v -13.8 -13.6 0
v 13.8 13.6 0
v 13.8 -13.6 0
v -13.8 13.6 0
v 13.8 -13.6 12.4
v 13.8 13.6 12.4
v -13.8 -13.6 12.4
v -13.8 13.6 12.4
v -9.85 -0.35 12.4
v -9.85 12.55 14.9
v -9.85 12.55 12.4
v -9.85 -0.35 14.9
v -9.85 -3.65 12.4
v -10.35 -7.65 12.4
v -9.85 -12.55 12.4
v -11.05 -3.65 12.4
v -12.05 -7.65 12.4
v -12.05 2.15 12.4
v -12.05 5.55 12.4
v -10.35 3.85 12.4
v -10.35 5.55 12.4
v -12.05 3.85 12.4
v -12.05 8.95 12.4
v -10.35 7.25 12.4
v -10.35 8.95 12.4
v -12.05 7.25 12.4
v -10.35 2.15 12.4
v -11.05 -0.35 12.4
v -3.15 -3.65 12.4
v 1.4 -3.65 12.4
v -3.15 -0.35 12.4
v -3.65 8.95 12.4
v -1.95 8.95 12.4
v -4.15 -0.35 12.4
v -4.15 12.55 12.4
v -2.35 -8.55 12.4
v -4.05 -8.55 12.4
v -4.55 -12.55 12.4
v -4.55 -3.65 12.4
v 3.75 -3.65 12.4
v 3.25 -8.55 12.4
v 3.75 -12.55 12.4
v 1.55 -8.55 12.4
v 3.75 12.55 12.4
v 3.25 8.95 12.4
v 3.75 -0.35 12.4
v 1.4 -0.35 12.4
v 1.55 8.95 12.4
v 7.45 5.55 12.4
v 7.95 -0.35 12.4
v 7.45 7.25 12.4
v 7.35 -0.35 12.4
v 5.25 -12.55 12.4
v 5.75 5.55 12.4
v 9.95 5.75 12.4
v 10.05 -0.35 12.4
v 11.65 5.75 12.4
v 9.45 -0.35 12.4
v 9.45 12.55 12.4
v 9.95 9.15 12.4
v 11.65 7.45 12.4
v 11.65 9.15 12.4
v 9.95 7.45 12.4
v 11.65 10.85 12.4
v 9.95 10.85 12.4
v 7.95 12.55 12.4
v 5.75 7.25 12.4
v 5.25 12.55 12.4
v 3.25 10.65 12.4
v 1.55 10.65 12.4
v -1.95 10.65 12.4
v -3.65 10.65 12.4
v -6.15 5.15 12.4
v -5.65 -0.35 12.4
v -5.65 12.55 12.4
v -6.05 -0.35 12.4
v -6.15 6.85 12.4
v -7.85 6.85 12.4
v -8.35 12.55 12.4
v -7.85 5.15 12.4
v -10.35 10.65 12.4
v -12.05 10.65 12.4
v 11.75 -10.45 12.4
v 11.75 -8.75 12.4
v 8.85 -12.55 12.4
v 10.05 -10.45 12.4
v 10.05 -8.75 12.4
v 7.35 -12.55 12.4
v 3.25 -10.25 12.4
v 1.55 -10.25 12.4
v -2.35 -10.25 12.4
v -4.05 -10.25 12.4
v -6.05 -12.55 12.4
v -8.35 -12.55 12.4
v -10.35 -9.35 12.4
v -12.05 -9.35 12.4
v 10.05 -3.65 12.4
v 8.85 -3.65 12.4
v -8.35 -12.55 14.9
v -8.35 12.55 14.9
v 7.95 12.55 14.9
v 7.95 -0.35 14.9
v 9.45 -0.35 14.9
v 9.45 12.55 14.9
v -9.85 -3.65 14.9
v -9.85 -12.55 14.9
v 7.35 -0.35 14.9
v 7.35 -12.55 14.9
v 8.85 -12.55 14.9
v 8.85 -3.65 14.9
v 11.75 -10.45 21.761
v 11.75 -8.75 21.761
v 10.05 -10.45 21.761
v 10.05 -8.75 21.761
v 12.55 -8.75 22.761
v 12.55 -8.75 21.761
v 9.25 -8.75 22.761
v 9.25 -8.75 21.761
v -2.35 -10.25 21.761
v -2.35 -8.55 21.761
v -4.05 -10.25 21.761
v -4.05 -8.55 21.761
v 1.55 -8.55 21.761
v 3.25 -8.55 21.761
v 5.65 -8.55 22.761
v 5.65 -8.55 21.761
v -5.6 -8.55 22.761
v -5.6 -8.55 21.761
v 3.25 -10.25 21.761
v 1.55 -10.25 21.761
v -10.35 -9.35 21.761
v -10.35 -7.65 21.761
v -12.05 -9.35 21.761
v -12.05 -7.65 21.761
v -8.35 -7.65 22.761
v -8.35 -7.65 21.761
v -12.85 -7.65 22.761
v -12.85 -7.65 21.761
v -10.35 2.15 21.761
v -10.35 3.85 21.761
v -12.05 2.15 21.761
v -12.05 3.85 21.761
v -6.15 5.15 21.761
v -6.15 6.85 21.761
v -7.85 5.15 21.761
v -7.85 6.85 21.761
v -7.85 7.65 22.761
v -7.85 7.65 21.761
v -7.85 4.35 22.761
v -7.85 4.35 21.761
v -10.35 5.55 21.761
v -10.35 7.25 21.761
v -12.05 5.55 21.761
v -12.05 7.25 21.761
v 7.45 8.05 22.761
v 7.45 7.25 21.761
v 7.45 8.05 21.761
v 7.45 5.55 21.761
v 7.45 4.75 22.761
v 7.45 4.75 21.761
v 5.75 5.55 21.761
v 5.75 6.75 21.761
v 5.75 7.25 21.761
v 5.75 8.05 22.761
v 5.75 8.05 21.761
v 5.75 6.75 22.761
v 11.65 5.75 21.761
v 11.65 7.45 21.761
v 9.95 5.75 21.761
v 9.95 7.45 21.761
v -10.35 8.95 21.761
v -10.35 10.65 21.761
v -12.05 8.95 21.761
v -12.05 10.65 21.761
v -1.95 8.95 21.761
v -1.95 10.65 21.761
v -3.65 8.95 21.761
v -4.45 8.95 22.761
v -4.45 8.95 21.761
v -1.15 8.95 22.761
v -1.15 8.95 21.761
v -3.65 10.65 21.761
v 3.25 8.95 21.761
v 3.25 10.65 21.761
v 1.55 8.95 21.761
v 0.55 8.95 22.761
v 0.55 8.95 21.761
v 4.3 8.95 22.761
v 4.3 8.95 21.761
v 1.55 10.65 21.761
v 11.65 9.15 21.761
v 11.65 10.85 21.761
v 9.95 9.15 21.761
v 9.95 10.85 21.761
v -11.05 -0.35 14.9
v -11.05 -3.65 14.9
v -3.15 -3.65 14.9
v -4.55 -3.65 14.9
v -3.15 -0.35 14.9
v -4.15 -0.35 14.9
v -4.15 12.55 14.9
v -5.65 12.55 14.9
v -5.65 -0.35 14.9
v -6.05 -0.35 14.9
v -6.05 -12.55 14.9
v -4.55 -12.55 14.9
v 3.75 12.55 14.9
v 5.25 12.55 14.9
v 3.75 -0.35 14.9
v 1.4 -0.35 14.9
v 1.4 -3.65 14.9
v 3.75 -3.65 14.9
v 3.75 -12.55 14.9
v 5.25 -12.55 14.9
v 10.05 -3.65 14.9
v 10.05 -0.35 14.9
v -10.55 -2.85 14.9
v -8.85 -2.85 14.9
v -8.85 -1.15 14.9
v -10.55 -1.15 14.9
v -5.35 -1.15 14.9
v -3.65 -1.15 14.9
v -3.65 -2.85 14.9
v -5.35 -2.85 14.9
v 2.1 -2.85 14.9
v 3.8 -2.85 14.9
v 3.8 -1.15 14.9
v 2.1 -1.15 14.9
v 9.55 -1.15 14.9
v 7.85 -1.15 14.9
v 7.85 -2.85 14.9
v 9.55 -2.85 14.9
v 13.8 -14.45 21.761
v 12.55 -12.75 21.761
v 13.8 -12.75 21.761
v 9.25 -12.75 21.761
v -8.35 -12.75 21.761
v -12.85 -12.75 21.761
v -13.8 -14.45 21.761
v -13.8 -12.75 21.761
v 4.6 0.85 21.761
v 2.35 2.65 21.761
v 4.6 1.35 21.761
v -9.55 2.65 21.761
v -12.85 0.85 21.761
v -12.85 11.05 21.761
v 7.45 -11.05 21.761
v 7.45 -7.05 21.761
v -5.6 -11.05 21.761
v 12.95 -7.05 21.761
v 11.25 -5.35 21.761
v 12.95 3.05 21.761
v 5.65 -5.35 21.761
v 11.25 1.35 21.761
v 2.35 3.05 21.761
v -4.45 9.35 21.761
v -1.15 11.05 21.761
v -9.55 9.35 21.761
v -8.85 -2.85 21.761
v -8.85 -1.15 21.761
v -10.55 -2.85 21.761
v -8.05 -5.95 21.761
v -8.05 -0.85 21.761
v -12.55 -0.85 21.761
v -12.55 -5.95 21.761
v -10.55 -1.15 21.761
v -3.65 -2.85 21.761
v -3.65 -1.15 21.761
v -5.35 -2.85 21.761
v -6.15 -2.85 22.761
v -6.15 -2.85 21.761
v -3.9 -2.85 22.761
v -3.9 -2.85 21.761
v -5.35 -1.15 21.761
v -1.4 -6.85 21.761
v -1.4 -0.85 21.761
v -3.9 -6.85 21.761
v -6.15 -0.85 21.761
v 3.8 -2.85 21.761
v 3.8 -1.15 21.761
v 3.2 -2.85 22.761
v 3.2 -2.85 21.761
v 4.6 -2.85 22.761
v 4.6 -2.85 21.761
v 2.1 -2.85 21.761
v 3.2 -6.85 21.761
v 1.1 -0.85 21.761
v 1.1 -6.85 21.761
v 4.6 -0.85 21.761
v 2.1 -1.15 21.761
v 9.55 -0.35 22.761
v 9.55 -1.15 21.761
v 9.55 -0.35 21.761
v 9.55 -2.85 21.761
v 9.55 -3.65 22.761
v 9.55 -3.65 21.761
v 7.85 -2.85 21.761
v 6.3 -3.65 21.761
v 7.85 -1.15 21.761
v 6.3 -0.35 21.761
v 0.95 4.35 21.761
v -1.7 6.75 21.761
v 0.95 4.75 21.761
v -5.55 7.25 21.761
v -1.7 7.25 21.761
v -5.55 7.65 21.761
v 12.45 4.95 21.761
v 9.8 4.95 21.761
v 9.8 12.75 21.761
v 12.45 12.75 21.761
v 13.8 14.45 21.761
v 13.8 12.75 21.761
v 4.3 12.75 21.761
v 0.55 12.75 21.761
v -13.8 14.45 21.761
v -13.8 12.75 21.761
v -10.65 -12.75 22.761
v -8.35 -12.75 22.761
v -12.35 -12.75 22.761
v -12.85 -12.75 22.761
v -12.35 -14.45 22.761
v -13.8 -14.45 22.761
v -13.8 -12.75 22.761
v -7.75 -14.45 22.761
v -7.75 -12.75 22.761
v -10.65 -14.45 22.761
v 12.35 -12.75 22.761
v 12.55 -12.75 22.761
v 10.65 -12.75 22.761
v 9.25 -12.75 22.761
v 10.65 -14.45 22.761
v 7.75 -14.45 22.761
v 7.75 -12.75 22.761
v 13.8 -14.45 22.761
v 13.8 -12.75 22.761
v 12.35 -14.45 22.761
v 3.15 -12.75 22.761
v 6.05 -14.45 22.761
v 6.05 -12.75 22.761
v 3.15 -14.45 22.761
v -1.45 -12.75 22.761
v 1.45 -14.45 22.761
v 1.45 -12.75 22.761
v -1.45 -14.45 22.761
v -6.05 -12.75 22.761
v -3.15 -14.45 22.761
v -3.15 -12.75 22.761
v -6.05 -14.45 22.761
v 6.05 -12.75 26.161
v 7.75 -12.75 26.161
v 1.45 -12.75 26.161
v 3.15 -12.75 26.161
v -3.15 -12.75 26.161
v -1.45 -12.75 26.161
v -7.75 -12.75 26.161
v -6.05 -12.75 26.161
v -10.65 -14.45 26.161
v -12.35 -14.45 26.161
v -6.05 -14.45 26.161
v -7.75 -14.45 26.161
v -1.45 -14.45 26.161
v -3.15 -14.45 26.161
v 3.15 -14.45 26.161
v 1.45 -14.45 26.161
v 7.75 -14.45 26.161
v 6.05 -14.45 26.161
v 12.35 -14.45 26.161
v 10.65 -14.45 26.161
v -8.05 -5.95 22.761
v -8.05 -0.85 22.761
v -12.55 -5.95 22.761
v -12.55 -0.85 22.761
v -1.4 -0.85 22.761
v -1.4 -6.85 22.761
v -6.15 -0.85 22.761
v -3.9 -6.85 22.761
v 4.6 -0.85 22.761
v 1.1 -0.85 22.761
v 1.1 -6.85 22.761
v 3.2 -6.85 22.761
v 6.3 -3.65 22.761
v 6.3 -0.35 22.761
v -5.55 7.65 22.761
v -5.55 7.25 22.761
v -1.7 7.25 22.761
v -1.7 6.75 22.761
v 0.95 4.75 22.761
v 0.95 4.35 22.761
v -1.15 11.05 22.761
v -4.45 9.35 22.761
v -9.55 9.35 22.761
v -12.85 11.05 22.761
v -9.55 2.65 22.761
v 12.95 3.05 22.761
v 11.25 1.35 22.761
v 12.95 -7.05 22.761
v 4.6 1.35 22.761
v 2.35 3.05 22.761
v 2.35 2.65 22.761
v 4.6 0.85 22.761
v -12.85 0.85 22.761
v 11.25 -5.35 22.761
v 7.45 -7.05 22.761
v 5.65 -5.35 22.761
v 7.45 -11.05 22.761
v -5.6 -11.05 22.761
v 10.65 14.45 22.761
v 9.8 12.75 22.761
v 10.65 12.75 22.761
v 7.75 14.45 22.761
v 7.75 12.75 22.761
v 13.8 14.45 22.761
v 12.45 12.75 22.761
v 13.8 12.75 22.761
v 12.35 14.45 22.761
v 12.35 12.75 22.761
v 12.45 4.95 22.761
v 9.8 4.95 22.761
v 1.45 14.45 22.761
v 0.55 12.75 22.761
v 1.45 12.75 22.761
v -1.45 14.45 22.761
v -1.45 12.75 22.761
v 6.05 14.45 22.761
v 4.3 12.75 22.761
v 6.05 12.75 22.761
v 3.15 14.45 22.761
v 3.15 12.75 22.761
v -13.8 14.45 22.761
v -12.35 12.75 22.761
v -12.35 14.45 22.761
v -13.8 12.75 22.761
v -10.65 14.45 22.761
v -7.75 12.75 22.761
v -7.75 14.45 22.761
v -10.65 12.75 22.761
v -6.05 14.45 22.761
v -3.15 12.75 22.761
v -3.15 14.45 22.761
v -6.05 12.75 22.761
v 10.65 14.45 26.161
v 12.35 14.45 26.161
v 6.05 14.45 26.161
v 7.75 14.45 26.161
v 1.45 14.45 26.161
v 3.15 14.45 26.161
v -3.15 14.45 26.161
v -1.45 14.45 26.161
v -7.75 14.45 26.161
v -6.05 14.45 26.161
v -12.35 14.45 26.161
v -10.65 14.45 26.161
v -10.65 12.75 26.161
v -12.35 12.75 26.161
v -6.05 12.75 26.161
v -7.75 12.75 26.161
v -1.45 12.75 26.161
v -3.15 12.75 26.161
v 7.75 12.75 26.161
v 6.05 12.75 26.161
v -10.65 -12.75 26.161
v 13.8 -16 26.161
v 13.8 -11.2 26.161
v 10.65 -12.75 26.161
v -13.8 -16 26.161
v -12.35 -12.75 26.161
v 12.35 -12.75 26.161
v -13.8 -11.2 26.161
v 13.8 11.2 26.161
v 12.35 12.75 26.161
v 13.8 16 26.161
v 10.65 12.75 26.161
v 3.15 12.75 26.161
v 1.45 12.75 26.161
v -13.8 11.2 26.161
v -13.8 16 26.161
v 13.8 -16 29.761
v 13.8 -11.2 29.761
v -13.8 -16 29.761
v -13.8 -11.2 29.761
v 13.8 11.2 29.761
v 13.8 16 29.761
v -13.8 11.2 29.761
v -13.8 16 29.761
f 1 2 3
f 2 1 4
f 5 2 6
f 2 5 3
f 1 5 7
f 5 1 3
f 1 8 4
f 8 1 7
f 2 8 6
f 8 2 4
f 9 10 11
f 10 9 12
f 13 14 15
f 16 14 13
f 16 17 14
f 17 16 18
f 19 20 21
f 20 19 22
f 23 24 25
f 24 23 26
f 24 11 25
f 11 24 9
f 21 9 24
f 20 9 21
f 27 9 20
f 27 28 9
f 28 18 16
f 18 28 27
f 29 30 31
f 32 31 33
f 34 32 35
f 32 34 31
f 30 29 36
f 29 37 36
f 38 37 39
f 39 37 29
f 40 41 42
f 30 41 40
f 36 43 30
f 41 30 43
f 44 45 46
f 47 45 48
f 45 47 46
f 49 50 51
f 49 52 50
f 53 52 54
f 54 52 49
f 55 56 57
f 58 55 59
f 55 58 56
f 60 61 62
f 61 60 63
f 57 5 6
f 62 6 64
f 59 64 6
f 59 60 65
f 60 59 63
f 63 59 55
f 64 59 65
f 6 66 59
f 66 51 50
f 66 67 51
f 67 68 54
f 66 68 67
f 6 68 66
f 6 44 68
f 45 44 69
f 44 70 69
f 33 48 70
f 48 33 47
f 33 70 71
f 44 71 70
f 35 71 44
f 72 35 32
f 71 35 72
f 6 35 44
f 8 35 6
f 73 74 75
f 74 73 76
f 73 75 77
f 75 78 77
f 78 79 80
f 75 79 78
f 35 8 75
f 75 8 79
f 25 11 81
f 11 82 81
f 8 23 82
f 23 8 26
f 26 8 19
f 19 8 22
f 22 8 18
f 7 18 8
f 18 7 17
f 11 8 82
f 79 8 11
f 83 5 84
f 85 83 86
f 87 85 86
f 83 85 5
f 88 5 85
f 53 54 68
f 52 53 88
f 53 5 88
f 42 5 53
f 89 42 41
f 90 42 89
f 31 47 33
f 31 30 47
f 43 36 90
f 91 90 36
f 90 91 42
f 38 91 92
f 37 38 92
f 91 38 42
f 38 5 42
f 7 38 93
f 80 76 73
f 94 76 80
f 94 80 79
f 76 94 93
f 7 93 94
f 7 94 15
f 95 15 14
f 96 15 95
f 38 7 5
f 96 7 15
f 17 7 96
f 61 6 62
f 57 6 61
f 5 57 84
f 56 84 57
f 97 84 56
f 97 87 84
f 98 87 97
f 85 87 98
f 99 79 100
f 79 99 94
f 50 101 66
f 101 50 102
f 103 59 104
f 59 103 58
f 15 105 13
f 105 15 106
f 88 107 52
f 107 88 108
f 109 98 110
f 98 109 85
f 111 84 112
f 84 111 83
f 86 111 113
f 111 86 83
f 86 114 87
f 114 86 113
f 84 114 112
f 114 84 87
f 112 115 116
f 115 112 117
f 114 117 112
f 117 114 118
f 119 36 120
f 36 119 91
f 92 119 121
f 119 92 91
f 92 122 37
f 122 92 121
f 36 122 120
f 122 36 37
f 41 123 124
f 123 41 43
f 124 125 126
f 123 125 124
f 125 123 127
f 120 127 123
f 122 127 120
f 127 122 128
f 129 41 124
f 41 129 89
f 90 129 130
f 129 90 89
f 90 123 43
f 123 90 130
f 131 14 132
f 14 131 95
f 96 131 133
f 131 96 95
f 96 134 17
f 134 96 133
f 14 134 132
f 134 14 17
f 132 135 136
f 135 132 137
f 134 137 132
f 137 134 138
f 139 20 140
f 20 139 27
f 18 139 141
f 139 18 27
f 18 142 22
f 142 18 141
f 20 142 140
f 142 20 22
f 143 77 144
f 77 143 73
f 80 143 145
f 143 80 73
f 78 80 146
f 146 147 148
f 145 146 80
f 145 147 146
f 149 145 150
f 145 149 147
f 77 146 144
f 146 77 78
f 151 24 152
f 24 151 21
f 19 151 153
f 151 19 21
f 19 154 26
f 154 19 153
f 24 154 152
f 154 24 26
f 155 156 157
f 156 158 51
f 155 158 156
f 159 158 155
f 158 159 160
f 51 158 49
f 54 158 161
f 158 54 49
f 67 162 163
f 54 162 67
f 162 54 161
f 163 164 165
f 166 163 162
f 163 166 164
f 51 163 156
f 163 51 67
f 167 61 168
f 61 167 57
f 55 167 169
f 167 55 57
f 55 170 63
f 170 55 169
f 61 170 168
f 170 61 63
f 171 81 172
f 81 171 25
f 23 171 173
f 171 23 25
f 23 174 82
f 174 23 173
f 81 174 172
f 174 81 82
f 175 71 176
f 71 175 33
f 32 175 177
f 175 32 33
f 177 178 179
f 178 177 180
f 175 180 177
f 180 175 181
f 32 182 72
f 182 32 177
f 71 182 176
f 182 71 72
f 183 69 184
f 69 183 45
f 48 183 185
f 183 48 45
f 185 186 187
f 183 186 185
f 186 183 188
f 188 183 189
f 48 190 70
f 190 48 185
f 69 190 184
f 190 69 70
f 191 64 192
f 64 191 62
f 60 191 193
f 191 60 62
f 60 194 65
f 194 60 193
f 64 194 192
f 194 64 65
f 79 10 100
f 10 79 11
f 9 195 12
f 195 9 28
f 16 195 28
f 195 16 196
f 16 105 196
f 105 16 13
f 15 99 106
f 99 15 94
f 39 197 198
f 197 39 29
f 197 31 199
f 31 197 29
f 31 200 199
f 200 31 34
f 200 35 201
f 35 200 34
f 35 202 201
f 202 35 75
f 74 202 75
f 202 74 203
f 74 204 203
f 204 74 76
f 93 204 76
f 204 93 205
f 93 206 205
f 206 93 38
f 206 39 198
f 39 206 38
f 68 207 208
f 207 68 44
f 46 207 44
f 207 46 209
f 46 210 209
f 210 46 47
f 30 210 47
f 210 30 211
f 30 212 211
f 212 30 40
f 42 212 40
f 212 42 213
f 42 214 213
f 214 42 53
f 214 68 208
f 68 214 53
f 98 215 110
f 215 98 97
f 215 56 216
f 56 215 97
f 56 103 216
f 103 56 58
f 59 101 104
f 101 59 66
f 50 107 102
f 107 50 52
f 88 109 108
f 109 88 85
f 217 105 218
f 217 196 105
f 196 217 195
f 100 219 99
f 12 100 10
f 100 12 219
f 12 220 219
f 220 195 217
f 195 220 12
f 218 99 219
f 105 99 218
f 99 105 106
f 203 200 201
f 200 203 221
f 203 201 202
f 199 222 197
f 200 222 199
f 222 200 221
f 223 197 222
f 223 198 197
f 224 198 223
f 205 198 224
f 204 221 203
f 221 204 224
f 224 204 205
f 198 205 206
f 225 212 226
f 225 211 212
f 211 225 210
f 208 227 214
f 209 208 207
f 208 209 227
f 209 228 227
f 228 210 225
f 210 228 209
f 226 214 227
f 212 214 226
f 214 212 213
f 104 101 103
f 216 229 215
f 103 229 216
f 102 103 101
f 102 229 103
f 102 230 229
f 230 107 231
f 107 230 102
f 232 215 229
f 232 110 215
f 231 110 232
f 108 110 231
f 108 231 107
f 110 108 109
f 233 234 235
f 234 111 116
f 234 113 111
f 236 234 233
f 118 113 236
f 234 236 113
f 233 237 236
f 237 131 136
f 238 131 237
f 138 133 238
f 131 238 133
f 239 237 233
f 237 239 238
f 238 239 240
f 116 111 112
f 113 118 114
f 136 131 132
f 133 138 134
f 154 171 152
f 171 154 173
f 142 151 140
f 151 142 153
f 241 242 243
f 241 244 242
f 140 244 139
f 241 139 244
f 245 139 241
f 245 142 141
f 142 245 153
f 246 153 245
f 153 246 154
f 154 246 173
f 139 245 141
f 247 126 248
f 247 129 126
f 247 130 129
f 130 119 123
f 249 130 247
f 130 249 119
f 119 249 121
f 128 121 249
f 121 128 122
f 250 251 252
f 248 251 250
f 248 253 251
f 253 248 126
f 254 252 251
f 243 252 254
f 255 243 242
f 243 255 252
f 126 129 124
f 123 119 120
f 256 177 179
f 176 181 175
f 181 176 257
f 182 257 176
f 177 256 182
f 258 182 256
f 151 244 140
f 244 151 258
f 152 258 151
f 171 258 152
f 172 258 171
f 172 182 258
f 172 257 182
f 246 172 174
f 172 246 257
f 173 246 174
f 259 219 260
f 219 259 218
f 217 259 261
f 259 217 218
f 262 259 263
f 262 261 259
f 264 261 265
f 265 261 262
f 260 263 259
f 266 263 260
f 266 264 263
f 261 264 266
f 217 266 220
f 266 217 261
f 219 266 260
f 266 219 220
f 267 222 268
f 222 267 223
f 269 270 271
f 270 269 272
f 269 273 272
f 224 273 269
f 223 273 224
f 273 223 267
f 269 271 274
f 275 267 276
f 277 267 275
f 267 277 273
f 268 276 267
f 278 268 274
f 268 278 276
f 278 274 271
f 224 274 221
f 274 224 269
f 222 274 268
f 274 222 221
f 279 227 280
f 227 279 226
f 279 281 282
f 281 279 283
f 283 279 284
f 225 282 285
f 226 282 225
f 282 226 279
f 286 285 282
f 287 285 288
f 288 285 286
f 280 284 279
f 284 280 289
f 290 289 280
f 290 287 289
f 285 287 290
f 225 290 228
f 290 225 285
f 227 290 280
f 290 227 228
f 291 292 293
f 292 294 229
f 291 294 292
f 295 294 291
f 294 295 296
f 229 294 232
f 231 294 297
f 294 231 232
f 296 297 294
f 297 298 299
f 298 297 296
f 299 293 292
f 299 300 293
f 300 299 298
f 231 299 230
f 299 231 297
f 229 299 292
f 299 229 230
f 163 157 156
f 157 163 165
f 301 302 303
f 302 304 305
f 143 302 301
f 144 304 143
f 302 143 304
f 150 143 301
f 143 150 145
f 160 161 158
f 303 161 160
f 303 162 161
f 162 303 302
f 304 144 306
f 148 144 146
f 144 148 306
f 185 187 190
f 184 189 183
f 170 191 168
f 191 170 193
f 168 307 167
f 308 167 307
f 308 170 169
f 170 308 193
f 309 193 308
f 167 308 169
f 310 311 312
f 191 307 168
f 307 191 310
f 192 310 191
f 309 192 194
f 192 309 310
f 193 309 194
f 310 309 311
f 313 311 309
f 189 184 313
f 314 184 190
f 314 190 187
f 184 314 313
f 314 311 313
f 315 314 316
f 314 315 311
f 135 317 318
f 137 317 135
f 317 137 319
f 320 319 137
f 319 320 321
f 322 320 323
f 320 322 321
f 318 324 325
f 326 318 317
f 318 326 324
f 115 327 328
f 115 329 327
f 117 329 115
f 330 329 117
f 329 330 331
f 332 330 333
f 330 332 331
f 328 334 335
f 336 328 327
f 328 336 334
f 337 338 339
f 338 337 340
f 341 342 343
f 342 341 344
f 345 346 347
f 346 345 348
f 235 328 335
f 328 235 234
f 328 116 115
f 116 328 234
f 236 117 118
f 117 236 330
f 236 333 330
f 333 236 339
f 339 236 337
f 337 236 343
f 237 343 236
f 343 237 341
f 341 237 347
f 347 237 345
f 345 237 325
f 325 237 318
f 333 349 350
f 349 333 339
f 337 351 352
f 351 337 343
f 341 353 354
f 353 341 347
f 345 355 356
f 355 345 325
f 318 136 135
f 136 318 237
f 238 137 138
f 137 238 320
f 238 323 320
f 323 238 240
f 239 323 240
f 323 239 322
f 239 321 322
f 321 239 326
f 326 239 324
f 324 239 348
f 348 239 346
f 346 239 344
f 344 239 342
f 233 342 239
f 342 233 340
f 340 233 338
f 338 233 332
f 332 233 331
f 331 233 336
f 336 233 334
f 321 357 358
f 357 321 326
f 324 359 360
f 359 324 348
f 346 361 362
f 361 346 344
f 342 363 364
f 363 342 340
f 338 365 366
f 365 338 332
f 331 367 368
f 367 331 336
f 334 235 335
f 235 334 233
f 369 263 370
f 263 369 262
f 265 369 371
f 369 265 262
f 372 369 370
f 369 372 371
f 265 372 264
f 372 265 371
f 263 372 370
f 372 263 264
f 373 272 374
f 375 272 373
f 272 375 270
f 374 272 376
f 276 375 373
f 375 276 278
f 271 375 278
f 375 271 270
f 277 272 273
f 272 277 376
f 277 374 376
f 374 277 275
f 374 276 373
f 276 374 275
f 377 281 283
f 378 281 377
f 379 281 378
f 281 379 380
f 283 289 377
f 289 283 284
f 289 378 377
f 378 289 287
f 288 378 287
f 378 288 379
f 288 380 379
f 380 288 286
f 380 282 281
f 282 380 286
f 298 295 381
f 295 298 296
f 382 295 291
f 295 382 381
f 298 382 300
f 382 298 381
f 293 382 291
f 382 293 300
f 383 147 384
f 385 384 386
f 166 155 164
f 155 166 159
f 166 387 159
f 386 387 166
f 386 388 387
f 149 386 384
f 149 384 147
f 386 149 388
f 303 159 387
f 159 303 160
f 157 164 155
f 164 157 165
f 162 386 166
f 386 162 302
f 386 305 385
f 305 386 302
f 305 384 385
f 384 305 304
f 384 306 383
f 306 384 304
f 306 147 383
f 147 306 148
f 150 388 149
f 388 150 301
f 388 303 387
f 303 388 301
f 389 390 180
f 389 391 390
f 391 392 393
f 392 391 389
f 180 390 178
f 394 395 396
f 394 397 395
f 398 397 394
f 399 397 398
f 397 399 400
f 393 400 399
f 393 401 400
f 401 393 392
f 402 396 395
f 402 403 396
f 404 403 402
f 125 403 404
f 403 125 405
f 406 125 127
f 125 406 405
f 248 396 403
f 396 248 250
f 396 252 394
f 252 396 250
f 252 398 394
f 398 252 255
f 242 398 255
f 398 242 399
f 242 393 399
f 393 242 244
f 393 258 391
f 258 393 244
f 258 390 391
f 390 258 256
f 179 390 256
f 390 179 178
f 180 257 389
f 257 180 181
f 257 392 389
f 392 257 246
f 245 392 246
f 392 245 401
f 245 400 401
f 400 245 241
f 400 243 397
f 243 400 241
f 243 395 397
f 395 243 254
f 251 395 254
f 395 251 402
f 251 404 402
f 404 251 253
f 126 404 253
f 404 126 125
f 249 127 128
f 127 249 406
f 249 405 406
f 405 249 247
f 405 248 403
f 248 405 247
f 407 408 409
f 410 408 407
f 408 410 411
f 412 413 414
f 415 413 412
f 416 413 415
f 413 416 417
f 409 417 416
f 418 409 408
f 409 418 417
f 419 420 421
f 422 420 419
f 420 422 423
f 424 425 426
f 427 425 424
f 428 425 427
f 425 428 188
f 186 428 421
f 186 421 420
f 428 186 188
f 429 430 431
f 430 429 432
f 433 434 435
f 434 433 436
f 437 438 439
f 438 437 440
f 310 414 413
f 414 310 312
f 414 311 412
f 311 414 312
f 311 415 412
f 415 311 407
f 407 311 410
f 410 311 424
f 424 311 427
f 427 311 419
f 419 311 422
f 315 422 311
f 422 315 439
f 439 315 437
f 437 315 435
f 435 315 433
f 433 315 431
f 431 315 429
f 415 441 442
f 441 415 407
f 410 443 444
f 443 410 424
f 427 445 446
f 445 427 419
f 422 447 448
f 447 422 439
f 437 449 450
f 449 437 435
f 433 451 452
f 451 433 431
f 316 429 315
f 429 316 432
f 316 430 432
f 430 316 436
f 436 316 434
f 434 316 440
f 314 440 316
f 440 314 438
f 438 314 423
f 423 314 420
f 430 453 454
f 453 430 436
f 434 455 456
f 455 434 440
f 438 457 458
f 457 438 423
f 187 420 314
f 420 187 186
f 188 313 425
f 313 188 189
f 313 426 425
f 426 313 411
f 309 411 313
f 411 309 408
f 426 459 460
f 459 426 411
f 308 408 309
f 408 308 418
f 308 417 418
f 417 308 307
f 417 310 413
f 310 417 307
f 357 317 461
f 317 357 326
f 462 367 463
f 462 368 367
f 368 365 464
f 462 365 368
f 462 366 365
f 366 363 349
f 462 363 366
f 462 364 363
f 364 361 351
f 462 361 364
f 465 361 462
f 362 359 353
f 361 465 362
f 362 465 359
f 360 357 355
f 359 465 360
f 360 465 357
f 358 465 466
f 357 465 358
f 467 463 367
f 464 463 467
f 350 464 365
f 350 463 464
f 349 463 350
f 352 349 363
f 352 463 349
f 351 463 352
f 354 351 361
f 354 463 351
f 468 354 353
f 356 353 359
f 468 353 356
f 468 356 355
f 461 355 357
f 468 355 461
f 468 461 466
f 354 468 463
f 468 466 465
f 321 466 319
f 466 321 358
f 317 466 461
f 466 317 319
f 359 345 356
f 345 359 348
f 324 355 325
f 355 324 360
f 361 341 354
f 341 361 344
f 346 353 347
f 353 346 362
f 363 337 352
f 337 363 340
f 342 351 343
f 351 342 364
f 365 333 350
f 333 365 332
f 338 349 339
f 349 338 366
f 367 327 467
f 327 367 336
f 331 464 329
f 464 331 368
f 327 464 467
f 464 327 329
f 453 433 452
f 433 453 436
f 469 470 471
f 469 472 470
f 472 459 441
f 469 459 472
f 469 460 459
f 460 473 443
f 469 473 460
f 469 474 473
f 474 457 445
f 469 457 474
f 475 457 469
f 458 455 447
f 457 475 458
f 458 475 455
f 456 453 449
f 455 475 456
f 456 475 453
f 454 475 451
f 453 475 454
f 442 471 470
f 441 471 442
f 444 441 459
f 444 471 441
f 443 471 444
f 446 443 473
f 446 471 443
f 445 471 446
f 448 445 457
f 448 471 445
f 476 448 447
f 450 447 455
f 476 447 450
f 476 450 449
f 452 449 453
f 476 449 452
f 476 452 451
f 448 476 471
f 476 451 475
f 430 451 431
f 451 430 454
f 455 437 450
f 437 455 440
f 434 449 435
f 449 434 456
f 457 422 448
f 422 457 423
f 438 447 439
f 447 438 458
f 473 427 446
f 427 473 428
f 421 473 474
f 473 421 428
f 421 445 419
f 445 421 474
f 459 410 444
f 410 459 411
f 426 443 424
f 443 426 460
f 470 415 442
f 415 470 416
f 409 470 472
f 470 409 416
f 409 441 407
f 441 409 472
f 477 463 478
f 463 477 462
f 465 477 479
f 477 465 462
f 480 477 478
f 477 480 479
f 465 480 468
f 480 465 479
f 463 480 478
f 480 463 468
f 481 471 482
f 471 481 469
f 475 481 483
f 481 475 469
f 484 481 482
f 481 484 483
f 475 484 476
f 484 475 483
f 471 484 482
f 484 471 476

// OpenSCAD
// Generated by SolidPython 0.4.2 on 2020-09-29 23:19:48
//!OpenSCAD

scale(v = 0.0100000000) {
	translate(v = [-1380, -1360, 0]) {
		union() {
			color(c = [0.4000000000, 0.4000000000, 0.4000000000]) {
				translate(v = [0, 0, 0]) {
					linear_extrude(height = 1000.0000000000) {
						polygon(paths = [[0, 1, 2, 3]], points = [[0, 0], [0, 2720], [2760, 2720], [2760, 0]]);
					}
				}
			}
			color(c = [0.2000000000, 0.6000000000, 0.2000000000]) {
				translate(v = [0, 0, 1000.0000000000]) {
					linear_extrude(height = 120.0000000000) {
						polygon(paths = [[0, 1, 2, 3]], points = [[0, 1305], [0, 2720], [2760, 2720], [2760, 1305]]);
					}
				}
			}
			color(c = [0.4000000000, 0.4000000000, 0.4000000000]) {
				translate(v = [0, 0, 1000.0000000000]) {
					linear_extrude(height = 120.0000000000) {
						polygon(paths = [[0, 1, 2, 3]], points = [[0, 0], [0, 1305], [2760, 1305], [2760, 0]]);
					}
				}
			}
			color(c = [0.9000000000, 0.6000000000, 0.6000000000]) {
				translate(v = [0, 0, 1120.0000000000]) {
					linear_extrude(height = 120.0000000000) {
						polygon(paths = [[0, 1, 2, 3]], points = [[135, 1485], [135, 2485], [395, 2485], [395, 1485]]);
					}
				}
			}
			color(c = [0.9000000000, 0.6000000000, 0.6000000000]) {
				translate(v = [0, 0, 1120.0000000000]) {
					linear_extrude(height = 120.0000000000) {
						polygon(paths = [[0, 1, 2, 3]], points = [[545, 1485], [545, 2485], [815, 2485], [815, 1485]]);
					}
				}
			}
			color(c = [0.9000000000, 0.6000000000, 0.6000000000]) {
				translate(v = [0, 0, 1120.0000000000]) {
					linear_extrude(height = 120.0000000000) {
						polygon(paths = [[0, 1, 2, 3]], points = [[965, 1485], [965, 2485], [1225, 2485], [1225, 1485]]);
					}
				}
			}
			color(c = [0.9000000000, 0.6000000000, 0.6000000000]) {
				translate(v = [0, 0, 1120.0000000000]) {
					linear_extrude(height = 120.0000000000) {
						polygon(paths = [[0, 1, 2, 3]], points = [[1495, 1485], [1495, 2485], [1755, 2485], [1755, 1485]]);
					}
				}
			}
			color(c = [0.9000000000, 0.6000000000, 0.6000000000]) {
				translate(v = [0, 0, 1120.0000000000]) {
					linear_extrude(height = 120.0000000000) {
						polygon(paths = [[0, 1, 2, 3]], points = [[1905, 1485], [1905, 2485], [2175, 2485], [2175, 1485]]);
					}
				}
			}
			color(c = [0.9000000000, 0.6000000000, 0.6000000000]) {
				translate(v = [0, 0, 1120.0000000000]) {
					linear_extrude(height = 120.0000000000) {
						polygon(paths = [[0, 1, 2, 3]], points = [[2325, 1485], [2325, 2485], [2625, 2485], [2625, 1485]]);
					}
				}
			}
			color(c = [0.9000000000, 0.6000000000, 0.9000000000]) {
				translate(v = [0, 0, 1120.0000000000]) {
					linear_extrude(height = 120.0000000000) {
						polygon(paths = [[0, 1, 2, 3]], points = [[135, 235], [135, 885], [395, 885], [395, 235]]);
					}
				}
			}
			color(c = [0.9000000000, 0.6000000000, 0.9000000000]) {
				translate(v = [0, 0, 1120.0000000000]) {
					linear_extrude(height = 120.0000000000) {
						polygon(paths = [[0, 1, 2, 3]], points = [[545, 235], [545, 885], [775, 885], [775, 235]]);
					}
				}
			}
			color(c = [0.9000000000, 0.6000000000, 0.9000000000]) {
				translate(v = [0, 0, 1120.0000000000]) {
					linear_extrude(height = 120.0000000000) {
						polygon(paths = [[0, 1, 2, 3]], points = [[925, 235], [925, 885], [1185, 885], [1185, 235]]);
					}
				}
			}
			color(c = [0.9000000000, 0.6000000000, 0.9000000000]) {
				translate(v = [0, 0, 1120.0000000000]) {
					linear_extrude(height = 120.0000000000) {
						polygon(paths = [[0, 1, 2, 3]], points = [[1495, 235], [1495, 885], [1755, 885], [1755, 235]]);
					}
				}
			}
			color(c = [0.9000000000, 0.6000000000, 0.9000000000]) {
				translate(v = [0, 0, 1120.0000000000]) {
					linear_extrude(height = 120.0000000000) {
						polygon(paths = [[0, 1, 2, 3]], points = [[1905, 235], [1905, 885], [2115, 885], [2115, 235]]);
					}
				}
			}
			color(c = [0.9000000000, 0.6000000000, 0.9000000000]) {
				translate(v = [0, 0, 1120.0000000000]) {
					linear_extrude(height = 120.0000000000) {
						polygon(paths = [[0, 1, 2, 3]], points = [[2265, 235], [2265, 885], [2625, 885], [2625, 235]]);
					}
				}
			}
			color(c = [0.2000000000, 0.6000000000, 0.2000000000]) {
				translate(v = [0, 0, 1120.0000000000]) {
					linear_extrude(height = 120.0000000000) {
						difference() {
							polygon(paths = [[0, 1, 2, 3]], points = [[0, 1305], [0, 2720], [2760, 2720], [2760, 1305]]);
							polygon(paths = [[0, 1, 2, 3]], points = [[135, 1485], [395, 1485], [395, 2485], [135, 2485]]);
							polygon(paths = [[0, 1, 2, 3]], points = [[545, 1485], [815, 1485], [815, 2485], [545, 2485]]);
							polygon(paths = [[0, 1, 2, 3]], points = [[965, 1485], [1225, 1485], [1225, 2485], [965, 2485]]);
							polygon(paths = [[0, 1, 2, 3]], points = [[1495, 1485], [1755, 1485], [1755, 2485], [1495, 2485]]);
							polygon(paths = [[0, 1, 2, 3]], points = [[1905, 1485], [2175, 1485], [2175, 2485], [1905, 2485]]);
							polygon(paths = [[0, 1, 2, 3]], points = [[2325, 1485], [2625, 1485], [2625, 2485], [2325, 2485]]);
						}
					}
				}
			}
			color(c = [0.4000000000, 0.4000000000, 0.4000000000]) {
				translate(v = [0, 0, 1120.0000000000]) {
					linear_extrude(height = 120.0000000000) {
						difference() {
							polygon(paths = [[0, 1, 2, 3]], points = [[0, 0], [0, 1305], [2760, 1305], [2760, 0]]);
							polygon(paths = [[0, 1, 2, 3]], points = [[135, 235], [395, 235], [395, 885], [135, 885]]);
							polygon(paths = [[0, 1, 2, 3]], points = [[545, 235], [775, 235], [775, 885], [545, 885]]);
							polygon(paths = [[0, 1, 2, 3]], points = [[925, 235], [1185, 235], [1185, 885], [925, 885]]);
							polygon(paths = [[0, 1, 2, 3]], points = [[1495, 235], [1755, 235], [1755, 885], [1495, 885]]);
							polygon(paths = [[0, 1, 2, 3]], points = [[1905, 235], [2115, 235], [2115, 885], [1905, 885]]);
							polygon(paths = [[0, 1, 2, 3]], points = [[2265, 235], [2625, 235], [2625, 885], [2265, 885]]);
						}
					}
				}
			}
			color(c = [0.1000000000, 0.1000000000, 0.1000000000]) {
				translate(v = [0, 0, 1240.0000000000]) {
					linear_extrude(height = 70.0000000000) {
						polygon(paths = [[0, 1, 2, 3]], points = [[2385, 315], [2385, 485], [2555, 485], [2555, 315]]);
					}
				}
			}
			color(c = [0.1000000000, 0.1000000000, 0.1000000000]) {
				translate(v = [0, 0, 1240.0000000000]) {
					linear_extrude(height = 70.0000000000) {
						polygon(paths = [[0, 1, 2, 3]], points = [[975, 335], [975, 505], [1145, 505], [1145, 335]]);
					}
				}
			}
			color(c = [0.1000000000, 0.1000000000, 0.1000000000]) {
				translate(v = [0, 0, 1240.0000000000]) {
					linear_extrude(height = 70.0000000000) {
						polygon(paths = [[0, 1, 2, 3]], points = [[1535, 335], [1535, 505], [1705, 505], [1705, 335]]);
					}
				}
			}
			color(c = [0.1000000000, 0.1000000000, 0.1000000000]) {
				translate(v = [0, 0, 1240.0000000000]) {
					linear_extrude(height = 70.0000000000) {
						polygon(paths = [[0, 1, 2, 3]], points = [[175, 425], [175, 595], [345, 595], [345, 425]]);
					}
				}
			}
			color(c = [0.1000000000, 0.1000000000, 0.1000000000]) {
				translate(v = [0, 0, 1240.0000000000]) {
					linear_extrude(height = 70.0000000000) {
						polygon(paths = [[0, 1, 2, 3]], points = [[175, 1575], [175, 1745], [345, 1745], [345, 1575]]);
					}
				}
			}
			color(c = [0.1000000000, 0.1000000000, 0.1000000000]) {
				translate(v = [0, 0, 1240.0000000000]) {
					linear_extrude(height = 70.0000000000) {
						polygon(paths = [[0, 1, 2, 3]], points = [[595, 1875], [595, 2045], [765, 2045], [765, 1875]]);
					}
				}
			}
			color(c = [0.1000000000, 0.1000000000, 0.1000000000]) {
				translate(v = [0, 0, 1240.0000000000]) {
					linear_extrude(height = 70.0000000000) {
						polygon(paths = [[0, 1, 2, 3]], points = [[175, 1915], [175, 2085], [345, 2085], [345, 1915]]);
					}
				}
			}
			color(c = [0.1000000000, 0.1000000000, 0.1000000000]) {
				translate(v = [0, 0, 1240.0000000000]) {
					linear_extrude(height = 70.0000000000) {
						polygon(paths = [[0, 1, 2, 3]], points = [[1955, 1915], [1955, 2085], [2125, 2085], [2125, 1915]]);
					}
				}
			}
			color(c = [0.1000000000, 0.1000000000, 0.1000000000]) {
				translate(v = [0, 0, 1240.0000000000]) {
					linear_extrude(height = 70.0000000000) {
						polygon(paths = [[0, 1, 2, 3]], points = [[2375, 1935], [2375, 2105], [2545, 2105], [2545, 1935]]);
					}
				}
			}
			color(c = [0.1000000000, 0.1000000000, 0.1000000000]) {
				translate(v = [0, 0, 1240.0000000000]) {
					linear_extrude(height = 70.0000000000) {
						polygon(paths = [[0, 1, 2, 3]], points = [[175, 2255], [175, 2425], [345, 2425], [345, 2255]]);
					}
				}
			}
			color(c = [0.1000000000, 0.1000000000, 0.1000000000]) {
				translate(v = [0, 0, 1240.0000000000]) {
					linear_extrude(height = 70.0000000000) {
						polygon(paths = [[0, 1, 2, 3]], points = [[1015, 2255], [1015, 2425], [1185, 2425], [1185, 2255]]);
					}
				}
			}
			color(c = [0.1000000000, 0.1000000000, 0.1000000000]) {
				translate(v = [0, 0, 1240.0000000000]) {
					linear_extrude(height = 70.0000000000) {
						polygon(paths = [[0, 1, 2, 3]], points = [[1535, 2255], [1535, 2425], [1705, 2425], [1705, 2255]]);
					}
				}
			}
			color(c = [0.1000000000, 0.1000000000, 0.1000000000]) {
				translate(v = [0, 0, 1240.0000000000]) {
					linear_extrude(height = 70.0000000000) {
						polygon(paths = [[0, 1, 2, 3]], points = [[2375, 2275], [2375, 2445], [2545, 2445], [2545, 2275]]);
					}
				}
			}
			color(c = [1.0000000000, 1.0000000000, 1.0000000000]) {
				translate(v = [0, 0, 1240.0000000000]) {
					linear_extrude(height = 70.0000000000) {
						polygon(paths = [[0, 1, 2, 3, 4, 5, 6, 7]], points = [[395, 105], [395, 995], [275, 995], [275, 1325], [395, 1325], [395, 2615], [545, 2615], [545, 105]]);
					}
				}
			}
			color(c = [1.0000000000, 1.0000000000, 1.0000000000]) {
				translate(v = [0, 0, 1240.0000000000]) {
					linear_extrude(height = 70.0000000000) {
						polygon(paths = [[0, 1, 2, 3, 4, 5, 6, 7, 8, 9]], points = [[775, 105], [775, 1325], [815, 1325], [815, 2615], [965, 2615], [965, 1325], [1065, 1325], [1065, 995], [925, 995], [925, 105]]);
					}
				}
			}
			color(c = [1.0000000000, 1.0000000000, 1.0000000000]) {
				translate(v = [0, 0, 1240.0000000000]) {
					linear_extrude(height = 70.0000000000) {
						polygon(paths = [[0, 1, 2, 3, 4, 5, 6, 7]], points = [[1755, 105], [1755, 995], [1520, 995], [1520, 1325], [1755, 1325], [1755, 2615], [1905, 2615], [1905, 105]]);
					}
				}
			}
			color(c = [1.0000000000, 1.0000000000, 1.0000000000]) {
				translate(v = [0, 0, 1240.0000000000]) {
					linear_extrude(height = 70.0000000000) {
						polygon(paths = [[0, 1, 2, 3, 4, 5, 6, 7, 8, 9]], points = [[2115, 105], [2115, 1325], [2175, 1325], [2175, 2615], [2325, 2615], [2325, 1325], [2385, 1325], [2385, 995], [2265, 995], [2265, 105]]);
					}
				}
			}
			color(c = [0.1000000000, 0.1000000000, 0.1000000000]) {
				translate(v = [0, 0, 1310.0000000000]) {
					linear_extrude(height = 180.0000000000) {
						polygon(paths = [[0, 1, 2, 3]], points = [[2385, 315], [2385, 485], [2555, 485], [2555, 315]]);
					}
				}
			}
			color(c = [0.1000000000, 0.1000000000, 0.1000000000]) {
				translate(v = [0, 0, 1310.0000000000]) {
					linear_extrude(height = 180.0000000000) {
						polygon(paths = [[0, 1, 2, 3]], points = [[975, 335], [975, 505], [1145, 505], [1145, 335]]);
					}
				}
			}
			color(c = [0.1000000000, 0.1000000000, 0.1000000000]) {
				translate(v = [0, 0, 1310.0000000000]) {
					linear_extrude(height = 180.0000000000) {
						polygon(paths = [[0, 1, 2, 3]], points = [[1535, 335], [1535, 505], [1705, 505], [1705, 335]]);
					}
				}
			}
			color(c = [0.1000000000, 0.1000000000, 0.1000000000]) {
				translate(v = [0, 0, 1310.0000000000]) {
					linear_extrude(height = 180.0000000000) {
						polygon(paths = [[0, 1, 2, 3]], points = [[175, 425], [175, 595], [345, 595], [345, 425]]);
					}
				}
			}
			color(c = [0.1000000000, 0.1000000000, 0.1000000000]) {
				translate(v = [0, 0, 1310.0000000000]) {
					linear_extrude(height = 180.0000000000) {
						polygon(paths = [[0, 1, 2, 3]], points = [[175, 1575], [175, 1745], [345, 1745], [345, 1575]]);
					}
				}
			}
			color(c = [0.1000000000, 0.1000000000, 0.1000000000]) {
				translate(v = [0, 0, 1310.0000000000]) {
					linear_extrude(height = 180.0000000000) {
						polygon(paths = [[0, 1, 2, 3]], points = [[595, 1875], [595, 2045], [765, 2045], [765, 1875]]);
					}
				}
			}
			color(c = [0.1000000000, 0.1000000000, 0.1000000000]) {
				translate(v = [0, 0, 1310.0000000000]) {
					linear_extrude(height = 180.0000000000) {
						polygon(paths = [[0, 1, 2, 3]], points = [[175, 1915], [175, 2085], [345, 2085], [345, 1915]]);
					}
				}
			}
			color(c = [0.1000000000, 0.1000000000, 0.1000000000]) {
				translate(v = [0, 0, 1310.0000000000]) {
					linear_extrude(height = 180.0000000000) {
						polygon(paths = [[0, 1, 2, 3]], points = [[1955, 1915], [1955, 2085], [2125, 2085], [2125, 1915]]);
					}
				}
			}
			color(c = [0.1000000000, 0.1000000000, 0.1000000000]) {
				translate(v = [0, 0, 1310.0000000000]) {
					linear_extrude(height = 180.0000000000) {
						polygon(paths = [[0, 1, 2, 3]], points = [[2375, 1935], [2375, 2105], [2545, 2105], [2545, 1935]]);
					}
				}
			}
			color(c = [0.1000000000, 0.1000000000, 0.1000000000]) {
				translate(v = [0, 0, 1310.0000000000]) {
					linear_extrude(height = 180.0000000000) {
						polygon(paths = [[0, 1, 2, 3]], points = [[175, 2255], [175, 2425], [345, 2425], [345, 2255]]);
					}
				}
			}
			color(c = [0.1000000000, 0.1000000000, 0.1000000000]) {
				translate(v = [0, 0, 1310.0000000000]) {
					linear_extrude(height = 180.0000000000) {
						polygon(paths = [[0, 1, 2, 3]], points = [[1015, 2255], [1015, 2425], [1185, 2425], [1185, 2255]]);
					}
				}
			}
			color(c = [0.1000000000, 0.1000000000, 0.1000000000]) {
				translate(v = [0, 0, 1310.0000000000]) {
					linear_extrude(height = 180.0000000000) {
						polygon(paths = [[0, 1, 2, 3]], points = [[1535, 2255], [1535, 2425], [1705, 2425], [1705, 2255]]);
					}
				}
			}
			color(c = [0.1000000000, 0.1000000000, 0.1000000000]) {
				translate(v = [0, 0, 1310.0000000000]) {
					linear_extrude(height = 180.0000000000) {
						polygon(paths = [[0, 1, 2, 3]], points = [[2375, 2275], [2375, 2445], [2545, 2445], [2545, 2275]]);
					}
				}
			}
			color(c = [0.7000000000, 0, 0]) {
				translate(v = [0, 0, 1310.0000000000]) {
					linear_extrude(height = 180.0000000000) {
						polygon(paths = [[0, 1, 2, 3, 4, 5, 6, 7]], points = [[395, 105], [395, 995], [275, 995], [275, 1325], [395, 1325], [395, 2615], [545, 2615], [545, 105]]);
					}
				}
			}
			color(c = [0.7000000000, 0, 0]) {
				translate(v = [0, 0, 1310.0000000000]) {
					linear_extrude(height = 180.0000000000) {
						polygon(paths = [[0, 1, 2, 3, 4, 5, 6, 7, 8, 9]], points = [[775, 105], [775, 1325], [815, 1325], [815, 2615], [965, 2615], [965, 1325], [1065, 1325], [1065, 995], [925, 995], [925, 105]]);
					}
				}
			}
			color(c = [0.7000000000, 0, 0]) {
				translate(v = [0, 0, 1310.0000000000]) {
					linear_extrude(height = 180.0000000000) {
						polygon(paths = [[0, 1, 2, 3, 4, 5, 6, 7]], points = [[1755, 105], [1755, 995], [1520, 995], [1520, 1325], [1755, 1325], [1755, 2615], [1905, 2615], [1905, 105]]);
					}
				}
			}
			color(c = [0.7000000000, 0, 0]) {
				translate(v = [0, 0, 1310.0000000000]) {
					linear_extrude(height = 180.0000000000) {
						polygon(paths = [[0, 1, 2, 3, 4, 5, 6, 7, 8, 9]], points = [[2115, 105], [2115, 1325], [2175, 1325], [2175, 2615], [2325, 2615], [2325, 1325], [2385, 1325], [2385, 995], [2265, 995], [2265, 105]]);
					}
				}
			}
			color(c = [0.1000000000, 0.1000000000, 0.1000000000]) {
				translate(v = [0, 0, 1490.0000000000]) {
					linear_extrude(height = 686.1000000000) {
						polygon(paths = [[0, 1, 2, 3]], points = [[2385, 315], [2385, 485], [2555, 485], [2555, 315]]);
					}
				}
			}
			color(c = [0.1000000000, 0.1000000000, 0.1000000000]) {
				translate(v = [0, 0, 1490.0000000000]) {
					linear_extrude(height = 686.1000000000) {
						polygon(paths = [[0, 1, 2, 3]], points = [[975, 335], [975, 505], [1145, 505], [1145, 335]]);
					}
				}
			}
			color(c = [0.1000000000, 0.1000000000, 0.1000000000]) {
				translate(v = [0, 0, 1490.0000000000]) {
					linear_extrude(height = 686.1000000000) {
						polygon(paths = [[0, 1, 2, 3]], points = [[1535, 335], [1535, 505], [1705, 505], [1705, 335]]);
					}
				}
			}
			color(c = [0.1000000000, 0.1000000000, 0.1000000000]) {
				translate(v = [0, 0, 1490.0000000000]) {
					linear_extrude(height = 686.1000000000) {
						polygon(paths = [[0, 1, 2, 3]], points = [[175, 425], [175, 595], [345, 595], [345, 425]]);
					}
				}
			}
			color(c = [0.1000000000, 0.1000000000, 0.1000000000]) {
				translate(v = [0, 0, 1490.0000000000]) {
					linear_extrude(height = 686.1000000000) {
						polygon(paths = [[0, 1, 2, 3]], points = [[325, 1075], [325, 1245], [495, 1245], [495, 1075]]);
					}
				}
			}
			color(c = [0.1000000000, 0.1000000000, 0.1000000000]) {
				translate(v = [0, 0, 1490.0000000000]) {
					linear_extrude(height = 686.1000000000) {
						polygon(paths = [[0, 1, 2, 3]], points = [[845, 1075], [845, 1245], [1015, 1245], [1015, 1075]]);
					}
				}
			}
			color(c = [0.1000000000, 0.1000000000, 0.1000000000]) {
				translate(v = [0, 0, 1490.0000000000]) {
					linear_extrude(height = 686.1000000000) {
						polygon(paths = [[0, 1, 2, 3]], points = [[1590, 1075], [1590, 1245], [1760, 1245], [1760, 1075]]);
					}
				}
			}
			color(c = [0.1000000000, 0.1000000000, 0.1000000000]) {
				translate(v = [0, 0, 1490.0000000000]) {
					linear_extrude(height = 686.1000000000) {
						polygon(paths = [[0, 1, 2, 3]], points = [[2165, 1075], [2165, 1245], [2335, 1245], [2335, 1075]]);
					}
				}
			}
			color(c = [0.1000000000, 0.1000000000, 0.1000000000]) {
				translate(v = [0, 0, 1490.0000000000]) {
					linear_extrude(height = 686.1000000000) {
						polygon(paths = [[0, 1, 2, 3]], points = [[175, 1575], [175, 1745], [345, 1745], [345, 1575]]);
					}
				}
			}
			color(c = [0.1000000000, 0.1000000000, 0.1000000000]) {
				translate(v = [0, 0, 1490.0000000000]) {
					linear_extrude(height = 686.1000000000) {
						polygon(paths = [[0, 1, 2, 3]], points = [[595, 1875], [595, 2045], [765, 2045], [765, 1875]]);
					}
				}
			}
			color(c = [0.1000000000, 0.1000000000, 0.1000000000]) {
				translate(v = [0, 0, 1490.0000000000]) {
					linear_extrude(height = 686.1000000000) {
						polygon(paths = [[0, 1, 2, 3]], points = [[175, 1915], [175, 2085], [345, 2085], [345, 1915]]);
					}
				}
			}
			color(c = [0.1000000000, 0.1000000000, 0.1000000000]) {
				translate(v = [0, 0, 1490.0000000000]) {
					linear_extrude(height = 686.1000000000) {
						polygon(paths = [[0, 1, 2, 3]], points = [[1955, 1915], [1955, 2085], [2125, 2085], [2125, 1915]]);
					}
				}
			}
			color(c = [0.1000000000, 0.1000000000, 0.1000000000]) {
				translate(v = [0, 0, 1490.0000000000]) {
					linear_extrude(height = 686.1000000000) {
						polygon(paths = [[0, 1, 2, 3]], points = [[2375, 1935], [2375, 2105], [2545, 2105], [2545, 1935]]);
					}
				}
			}
			color(c = [0.1000000000, 0.1000000000, 0.1000000000]) {
				translate(v = [0, 0, 1490.0000000000]) {
					linear_extrude(height = 686.1000000000) {
						polygon(paths = [[0, 1, 2, 3]], points = [[175, 2255], [175, 2425], [345, 2425], [345, 2255]]);
					}
				}
			}
			color(c = [0.1000000000, 0.1000000000, 0.1000000000]) {
				translate(v = [0, 0, 1490.0000000000]) {
					linear_extrude(height = 686.1000000000) {
						polygon(paths = [[0, 1, 2, 3]], points = [[1015, 2255], [1015, 2425], [1185, 2425], [1185, 2255]]);
					}
				}
			}
			color(c = [0.1000000000, 0.1000000000, 0.1000000000]) {
				translate(v = [0, 0, 1490.0000000000]) {
					linear_extrude(height = 686.1000000000) {
						polygon(paths = [[0, 1, 2, 3]], points = [[1535, 2255], [1535, 2425], [1705, 2425], [1705, 2255]]);
					}
				}
			}
			color(c = [0.1000000000, 0.1000000000, 0.1000000000]) {
				translate(v = [0, 0, 1490.0000000000]) {
					linear_extrude(height = 686.1000000000) {
						polygon(paths = [[0, 1, 2, 3]], points = [[2375, 2275], [2375, 2445], [2545, 2445], [2545, 2275]]);
					}
				}
			}
			color(c = [0.9000000000, 0.6000000000, 0.6000000000]) {
				translate(v = [0, 0, 2176.1000000000]) {
					linear_extrude(height = 100.0000000000) {
						polygon(paths = [[0, 1, 2, 3, 4, 5, 6, 7, 8, 9, 10, 11]], points = [[0, -85], [0, 85], [95, 85], [95, 595], [545, 595], [545, 85], [2305, 85], [2305, 485], [2635, 485], [2635, 85], [2760, 85], [2760, -85]]);
					}
				}
			}
			color(c = [0.9000000000, 0.6000000000, 0.6000000000]) {
				translate(v = [0, 0, 2176.1000000000]) {
					linear_extrude(height = 100.0000000000) {
						polygon(paths = [[0, 1, 2, 3]], points = [[125, 765], [125, 1275], [575, 1275], [575, 765]]);
					}
				}
			}
			color(c = [0.9000000000, 0.6000000000, 0.6000000000]) {
				translate(v = [0, 0, 2176.1000000000]) {
					linear_extrude(height = 100.0000000000) {
						polygon(paths = [[0, 1, 2, 3, 4, 5]], points = [[990, 675], [990, 1075], [765, 1075], [765, 1275], [1240, 1275], [1240, 675]]);
					}
				}
			}
			color(c = [0.9000000000, 0.6000000000, 0.6000000000]) {
				translate(v = [0, 0, 2176.1000000000]) {
					linear_extrude(height = 100.0000000000) {
						polygon(paths = [[0, 1, 2, 3, 4, 5]], points = [[1490, 675], [1490, 1275], [1840, 1275], [1840, 1075], [1700, 1075], [1700, 675]]);
					}
				}
			}
			color(c = [0.9000000000, 0.6000000000, 0.6000000000]) {
				translate(v = [0, 0, 2176.1000000000]) {
					linear_extrude(height = 100.0000000000) {
						polygon(paths = [[0, 1, 2, 3]], points = [[2010, 995], [2010, 1325], [2335, 1325], [2335, 995]]);
					}
				}
			}
			color(c = [0.9000000000, 0.6000000000, 0.6000000000]) {
				translate(v = [0, 0, 2176.1000000000]) {
					linear_extrude(height = 100.0000000000) {
						polygon(paths = [[0, 1, 2, 3, 4, 5, 6, 7, 8, 9, 10, 11]], points = [[595, 1795], [595, 2125], [825, 2125], [825, 2085], [1210, 2085], [1210, 2035], [1955, 2035], [1955, 2165], [2125, 2165], [2125, 1835], [1475, 1835], [1475, 1795]]);
					}
				}
			}
			color(c = [0.9000000000, 0.6000000000, 0.6000000000]) {
				translate(v = [0, 0, 2176.1000000000]) {
					linear_extrude(height = 100.0000000000) {
						polygon(paths = [[0, 1, 2, 3, 4, 5, 6, 7, 8, 9, 10, 11, 12, 13, 14, 15, 16, 17, 18, 19, 20, 21]], points = [[820, 255], [820, 505], [1945, 505], [1945, 825], [2505, 825], [2505, 1495], [1840, 1495], [1840, 1445], [95, 1445], [95, 2465], [1265, 2465], [1265, 2255], [935, 2255], [935, 2295], [425, 2295], [425, 1625], [1615, 1625], [1615, 1665], [2675, 1665], [2675, 655], [2125, 655], [2125, 255]]);
					}
				}
			}
			color(c = [0.9000000000, 0.6000000000, 0.6000000000]) {
				translate(v = [0, 0, 2176.1000000000]) {
					linear_extrude(height = 100.0000000000) {
						polygon(paths = [[0, 1, 2, 3, 4, 5, 6, 7, 8, 9, 10, 11]], points = [[2360, 1855], [2360, 2635], [1810, 2635], [1810, 2255], [1435, 2255], [1435, 2635], [0, 2635], [0, 2805], [2760, 2805], [2760, 2635], [2625, 2635], [2625, 1855]]);
					}
				}
			}
			color(c = [0.5000000000, 0.5000000000, 0.5000000000]) {
				translate(v = [0, 0, 2276.1000000000]) {
					linear_extrude(height = 340.0000000000) {
						polygon(paths = [[0, 1, 2, 3]], points = [[145, -85], [145, 85], [315, 85], [315, -85]]);
					}
				}
			}
			color(c = [0.5000000000, 0.5000000000, 0.5000000000]) {
				translate(v = [0, 0, 2276.1000000000]) {
					linear_extrude(height = 340.0000000000) {
						polygon(paths = [[0, 1, 2, 3]], points = [[605, -85], [605, 85], [775, 85], [775, -85]]);
					}
				}
			}
			color(c = [0.5000000000, 0.5000000000, 0.5000000000]) {
				translate(v = [0, 0, 2276.1000000000]) {
					linear_extrude(height = 340.0000000000) {
						polygon(paths = [[0, 1, 2, 3]], points = [[1065, -85], [1065, 85], [1235, 85], [1235, -85]]);
					}
				}
			}
			color(c = [0.5000000000, 0.5000000000, 0.5000000000]) {
				translate(v = [0, 0, 2276.1000000000]) {
					linear_extrude(height = 340.0000000000) {
						polygon(paths = [[0, 1, 2, 3]], points = [[1525, -85], [1525, 85], [1695, 85], [1695, -85]]);
					}
				}
			}
			color(c = [0.5000000000, 0.5000000000, 0.5000000000]) {
				translate(v = [0, 0, 2276.1000000000]) {
					linear_extrude(height = 340.0000000000) {
						polygon(paths = [[0, 1, 2, 3]], points = [[1985, -85], [1985, 85], [2155, 85], [2155, -85]]);
					}
				}
			}
			color(c = [0.5000000000, 0.5000000000, 0.5000000000]) {
				translate(v = [0, 0, 2276.1000000000]) {
					linear_extrude(height = 340.0000000000) {
						polygon(paths = [[0, 1, 2, 3]], points = [[2445, -85], [2445, 85], [2615, 85], [2615, -85]]);
					}
				}
			}
			color(c = [0.5000000000, 0.5000000000, 0.5000000000]) {
				translate(v = [0, 0, 2276.1000000000]) {
					linear_extrude(height = 340.0000000000) {
						polygon(paths = [[0, 1, 2, 3]], points = [[145, 2635], [145, 2805], [315, 2805], [315, 2635]]);
					}
				}
			}
			color(c = [0.5000000000, 0.5000000000, 0.5000000000]) {
				translate(v = [0, 0, 2276.1000000000]) {
					linear_extrude(height = 340.0000000000) {
						polygon(paths = [[0, 1, 2, 3]], points = [[605, 2635], [605, 2805], [775, 2805], [775, 2635]]);
					}
				}
			}
			color(c = [0.5000000000, 0.5000000000, 0.5000000000]) {
				translate(v = [0, 0, 2276.1000000000]) {
					linear_extrude(height = 340.0000000000) {
						polygon(paths = [[0, 1, 2, 3]], points = [[1065, 2635], [1065, 2805], [1235, 2805], [1235, 2635]]);
					}
				}
			}
			color(c = [0.5000000000, 0.5000000000, 0.5000000000]) {
				translate(v = [0, 0, 2276.1000000000]) {
					linear_extrude(height = 340.0000000000) {
						polygon(paths = [[0, 1, 2, 3]], points = [[1525, 2635], [1525, 2805], [1695, 2805], [1695, 2635]]);
					}
				}
			}
			color(c = [0.5000000000, 0.5000000000, 0.5000000000]) {
				translate(v = [0, 0, 2276.1000000000]) {
					linear_extrude(height = 340.0000000000) {
						polygon(paths = [[0, 1, 2, 3]], points = [[1985, 2635], [1985, 2805], [2155, 2805], [2155, 2635]]);
					}
				}
			}
			color(c = [0.5000000000, 0.5000000000, 0.5000000000]) {
				translate(v = [0, 0, 2276.1000000000]) {
					linear_extrude(height = 340.0000000000) {
						polygon(paths = [[0, 1, 2, 3]], points = [[2445, 2635], [2445, 2805], [2615, 2805], [2615, 2635]]);
					}
				}
			}
			color(c = [0.3000000000, 0.3000000000, 1]) {
				translate(v = [0, 0, 2616.1000000000]) {
					linear_extrude(height = 360.0000000000) {
						polygon(paths = [[0, 1, 2, 3]], points = [[0, -240], [0, 240], [2760, 240], [2760, -240]]);
					}
				}
			}
			color(c = [0.3000000000, 0.3000000000, 1]) {
				translate(v = [0, 0, 2616.1000000000]) {
					linear_extrude(height = 360.0000000000) {
						polygon(paths = [[0, 1, 2, 3]], points = [[0, 2480], [0, 2960], [2760, 2960], [2760, 2480]]);
					}
				}
			}
		}
	}
}
